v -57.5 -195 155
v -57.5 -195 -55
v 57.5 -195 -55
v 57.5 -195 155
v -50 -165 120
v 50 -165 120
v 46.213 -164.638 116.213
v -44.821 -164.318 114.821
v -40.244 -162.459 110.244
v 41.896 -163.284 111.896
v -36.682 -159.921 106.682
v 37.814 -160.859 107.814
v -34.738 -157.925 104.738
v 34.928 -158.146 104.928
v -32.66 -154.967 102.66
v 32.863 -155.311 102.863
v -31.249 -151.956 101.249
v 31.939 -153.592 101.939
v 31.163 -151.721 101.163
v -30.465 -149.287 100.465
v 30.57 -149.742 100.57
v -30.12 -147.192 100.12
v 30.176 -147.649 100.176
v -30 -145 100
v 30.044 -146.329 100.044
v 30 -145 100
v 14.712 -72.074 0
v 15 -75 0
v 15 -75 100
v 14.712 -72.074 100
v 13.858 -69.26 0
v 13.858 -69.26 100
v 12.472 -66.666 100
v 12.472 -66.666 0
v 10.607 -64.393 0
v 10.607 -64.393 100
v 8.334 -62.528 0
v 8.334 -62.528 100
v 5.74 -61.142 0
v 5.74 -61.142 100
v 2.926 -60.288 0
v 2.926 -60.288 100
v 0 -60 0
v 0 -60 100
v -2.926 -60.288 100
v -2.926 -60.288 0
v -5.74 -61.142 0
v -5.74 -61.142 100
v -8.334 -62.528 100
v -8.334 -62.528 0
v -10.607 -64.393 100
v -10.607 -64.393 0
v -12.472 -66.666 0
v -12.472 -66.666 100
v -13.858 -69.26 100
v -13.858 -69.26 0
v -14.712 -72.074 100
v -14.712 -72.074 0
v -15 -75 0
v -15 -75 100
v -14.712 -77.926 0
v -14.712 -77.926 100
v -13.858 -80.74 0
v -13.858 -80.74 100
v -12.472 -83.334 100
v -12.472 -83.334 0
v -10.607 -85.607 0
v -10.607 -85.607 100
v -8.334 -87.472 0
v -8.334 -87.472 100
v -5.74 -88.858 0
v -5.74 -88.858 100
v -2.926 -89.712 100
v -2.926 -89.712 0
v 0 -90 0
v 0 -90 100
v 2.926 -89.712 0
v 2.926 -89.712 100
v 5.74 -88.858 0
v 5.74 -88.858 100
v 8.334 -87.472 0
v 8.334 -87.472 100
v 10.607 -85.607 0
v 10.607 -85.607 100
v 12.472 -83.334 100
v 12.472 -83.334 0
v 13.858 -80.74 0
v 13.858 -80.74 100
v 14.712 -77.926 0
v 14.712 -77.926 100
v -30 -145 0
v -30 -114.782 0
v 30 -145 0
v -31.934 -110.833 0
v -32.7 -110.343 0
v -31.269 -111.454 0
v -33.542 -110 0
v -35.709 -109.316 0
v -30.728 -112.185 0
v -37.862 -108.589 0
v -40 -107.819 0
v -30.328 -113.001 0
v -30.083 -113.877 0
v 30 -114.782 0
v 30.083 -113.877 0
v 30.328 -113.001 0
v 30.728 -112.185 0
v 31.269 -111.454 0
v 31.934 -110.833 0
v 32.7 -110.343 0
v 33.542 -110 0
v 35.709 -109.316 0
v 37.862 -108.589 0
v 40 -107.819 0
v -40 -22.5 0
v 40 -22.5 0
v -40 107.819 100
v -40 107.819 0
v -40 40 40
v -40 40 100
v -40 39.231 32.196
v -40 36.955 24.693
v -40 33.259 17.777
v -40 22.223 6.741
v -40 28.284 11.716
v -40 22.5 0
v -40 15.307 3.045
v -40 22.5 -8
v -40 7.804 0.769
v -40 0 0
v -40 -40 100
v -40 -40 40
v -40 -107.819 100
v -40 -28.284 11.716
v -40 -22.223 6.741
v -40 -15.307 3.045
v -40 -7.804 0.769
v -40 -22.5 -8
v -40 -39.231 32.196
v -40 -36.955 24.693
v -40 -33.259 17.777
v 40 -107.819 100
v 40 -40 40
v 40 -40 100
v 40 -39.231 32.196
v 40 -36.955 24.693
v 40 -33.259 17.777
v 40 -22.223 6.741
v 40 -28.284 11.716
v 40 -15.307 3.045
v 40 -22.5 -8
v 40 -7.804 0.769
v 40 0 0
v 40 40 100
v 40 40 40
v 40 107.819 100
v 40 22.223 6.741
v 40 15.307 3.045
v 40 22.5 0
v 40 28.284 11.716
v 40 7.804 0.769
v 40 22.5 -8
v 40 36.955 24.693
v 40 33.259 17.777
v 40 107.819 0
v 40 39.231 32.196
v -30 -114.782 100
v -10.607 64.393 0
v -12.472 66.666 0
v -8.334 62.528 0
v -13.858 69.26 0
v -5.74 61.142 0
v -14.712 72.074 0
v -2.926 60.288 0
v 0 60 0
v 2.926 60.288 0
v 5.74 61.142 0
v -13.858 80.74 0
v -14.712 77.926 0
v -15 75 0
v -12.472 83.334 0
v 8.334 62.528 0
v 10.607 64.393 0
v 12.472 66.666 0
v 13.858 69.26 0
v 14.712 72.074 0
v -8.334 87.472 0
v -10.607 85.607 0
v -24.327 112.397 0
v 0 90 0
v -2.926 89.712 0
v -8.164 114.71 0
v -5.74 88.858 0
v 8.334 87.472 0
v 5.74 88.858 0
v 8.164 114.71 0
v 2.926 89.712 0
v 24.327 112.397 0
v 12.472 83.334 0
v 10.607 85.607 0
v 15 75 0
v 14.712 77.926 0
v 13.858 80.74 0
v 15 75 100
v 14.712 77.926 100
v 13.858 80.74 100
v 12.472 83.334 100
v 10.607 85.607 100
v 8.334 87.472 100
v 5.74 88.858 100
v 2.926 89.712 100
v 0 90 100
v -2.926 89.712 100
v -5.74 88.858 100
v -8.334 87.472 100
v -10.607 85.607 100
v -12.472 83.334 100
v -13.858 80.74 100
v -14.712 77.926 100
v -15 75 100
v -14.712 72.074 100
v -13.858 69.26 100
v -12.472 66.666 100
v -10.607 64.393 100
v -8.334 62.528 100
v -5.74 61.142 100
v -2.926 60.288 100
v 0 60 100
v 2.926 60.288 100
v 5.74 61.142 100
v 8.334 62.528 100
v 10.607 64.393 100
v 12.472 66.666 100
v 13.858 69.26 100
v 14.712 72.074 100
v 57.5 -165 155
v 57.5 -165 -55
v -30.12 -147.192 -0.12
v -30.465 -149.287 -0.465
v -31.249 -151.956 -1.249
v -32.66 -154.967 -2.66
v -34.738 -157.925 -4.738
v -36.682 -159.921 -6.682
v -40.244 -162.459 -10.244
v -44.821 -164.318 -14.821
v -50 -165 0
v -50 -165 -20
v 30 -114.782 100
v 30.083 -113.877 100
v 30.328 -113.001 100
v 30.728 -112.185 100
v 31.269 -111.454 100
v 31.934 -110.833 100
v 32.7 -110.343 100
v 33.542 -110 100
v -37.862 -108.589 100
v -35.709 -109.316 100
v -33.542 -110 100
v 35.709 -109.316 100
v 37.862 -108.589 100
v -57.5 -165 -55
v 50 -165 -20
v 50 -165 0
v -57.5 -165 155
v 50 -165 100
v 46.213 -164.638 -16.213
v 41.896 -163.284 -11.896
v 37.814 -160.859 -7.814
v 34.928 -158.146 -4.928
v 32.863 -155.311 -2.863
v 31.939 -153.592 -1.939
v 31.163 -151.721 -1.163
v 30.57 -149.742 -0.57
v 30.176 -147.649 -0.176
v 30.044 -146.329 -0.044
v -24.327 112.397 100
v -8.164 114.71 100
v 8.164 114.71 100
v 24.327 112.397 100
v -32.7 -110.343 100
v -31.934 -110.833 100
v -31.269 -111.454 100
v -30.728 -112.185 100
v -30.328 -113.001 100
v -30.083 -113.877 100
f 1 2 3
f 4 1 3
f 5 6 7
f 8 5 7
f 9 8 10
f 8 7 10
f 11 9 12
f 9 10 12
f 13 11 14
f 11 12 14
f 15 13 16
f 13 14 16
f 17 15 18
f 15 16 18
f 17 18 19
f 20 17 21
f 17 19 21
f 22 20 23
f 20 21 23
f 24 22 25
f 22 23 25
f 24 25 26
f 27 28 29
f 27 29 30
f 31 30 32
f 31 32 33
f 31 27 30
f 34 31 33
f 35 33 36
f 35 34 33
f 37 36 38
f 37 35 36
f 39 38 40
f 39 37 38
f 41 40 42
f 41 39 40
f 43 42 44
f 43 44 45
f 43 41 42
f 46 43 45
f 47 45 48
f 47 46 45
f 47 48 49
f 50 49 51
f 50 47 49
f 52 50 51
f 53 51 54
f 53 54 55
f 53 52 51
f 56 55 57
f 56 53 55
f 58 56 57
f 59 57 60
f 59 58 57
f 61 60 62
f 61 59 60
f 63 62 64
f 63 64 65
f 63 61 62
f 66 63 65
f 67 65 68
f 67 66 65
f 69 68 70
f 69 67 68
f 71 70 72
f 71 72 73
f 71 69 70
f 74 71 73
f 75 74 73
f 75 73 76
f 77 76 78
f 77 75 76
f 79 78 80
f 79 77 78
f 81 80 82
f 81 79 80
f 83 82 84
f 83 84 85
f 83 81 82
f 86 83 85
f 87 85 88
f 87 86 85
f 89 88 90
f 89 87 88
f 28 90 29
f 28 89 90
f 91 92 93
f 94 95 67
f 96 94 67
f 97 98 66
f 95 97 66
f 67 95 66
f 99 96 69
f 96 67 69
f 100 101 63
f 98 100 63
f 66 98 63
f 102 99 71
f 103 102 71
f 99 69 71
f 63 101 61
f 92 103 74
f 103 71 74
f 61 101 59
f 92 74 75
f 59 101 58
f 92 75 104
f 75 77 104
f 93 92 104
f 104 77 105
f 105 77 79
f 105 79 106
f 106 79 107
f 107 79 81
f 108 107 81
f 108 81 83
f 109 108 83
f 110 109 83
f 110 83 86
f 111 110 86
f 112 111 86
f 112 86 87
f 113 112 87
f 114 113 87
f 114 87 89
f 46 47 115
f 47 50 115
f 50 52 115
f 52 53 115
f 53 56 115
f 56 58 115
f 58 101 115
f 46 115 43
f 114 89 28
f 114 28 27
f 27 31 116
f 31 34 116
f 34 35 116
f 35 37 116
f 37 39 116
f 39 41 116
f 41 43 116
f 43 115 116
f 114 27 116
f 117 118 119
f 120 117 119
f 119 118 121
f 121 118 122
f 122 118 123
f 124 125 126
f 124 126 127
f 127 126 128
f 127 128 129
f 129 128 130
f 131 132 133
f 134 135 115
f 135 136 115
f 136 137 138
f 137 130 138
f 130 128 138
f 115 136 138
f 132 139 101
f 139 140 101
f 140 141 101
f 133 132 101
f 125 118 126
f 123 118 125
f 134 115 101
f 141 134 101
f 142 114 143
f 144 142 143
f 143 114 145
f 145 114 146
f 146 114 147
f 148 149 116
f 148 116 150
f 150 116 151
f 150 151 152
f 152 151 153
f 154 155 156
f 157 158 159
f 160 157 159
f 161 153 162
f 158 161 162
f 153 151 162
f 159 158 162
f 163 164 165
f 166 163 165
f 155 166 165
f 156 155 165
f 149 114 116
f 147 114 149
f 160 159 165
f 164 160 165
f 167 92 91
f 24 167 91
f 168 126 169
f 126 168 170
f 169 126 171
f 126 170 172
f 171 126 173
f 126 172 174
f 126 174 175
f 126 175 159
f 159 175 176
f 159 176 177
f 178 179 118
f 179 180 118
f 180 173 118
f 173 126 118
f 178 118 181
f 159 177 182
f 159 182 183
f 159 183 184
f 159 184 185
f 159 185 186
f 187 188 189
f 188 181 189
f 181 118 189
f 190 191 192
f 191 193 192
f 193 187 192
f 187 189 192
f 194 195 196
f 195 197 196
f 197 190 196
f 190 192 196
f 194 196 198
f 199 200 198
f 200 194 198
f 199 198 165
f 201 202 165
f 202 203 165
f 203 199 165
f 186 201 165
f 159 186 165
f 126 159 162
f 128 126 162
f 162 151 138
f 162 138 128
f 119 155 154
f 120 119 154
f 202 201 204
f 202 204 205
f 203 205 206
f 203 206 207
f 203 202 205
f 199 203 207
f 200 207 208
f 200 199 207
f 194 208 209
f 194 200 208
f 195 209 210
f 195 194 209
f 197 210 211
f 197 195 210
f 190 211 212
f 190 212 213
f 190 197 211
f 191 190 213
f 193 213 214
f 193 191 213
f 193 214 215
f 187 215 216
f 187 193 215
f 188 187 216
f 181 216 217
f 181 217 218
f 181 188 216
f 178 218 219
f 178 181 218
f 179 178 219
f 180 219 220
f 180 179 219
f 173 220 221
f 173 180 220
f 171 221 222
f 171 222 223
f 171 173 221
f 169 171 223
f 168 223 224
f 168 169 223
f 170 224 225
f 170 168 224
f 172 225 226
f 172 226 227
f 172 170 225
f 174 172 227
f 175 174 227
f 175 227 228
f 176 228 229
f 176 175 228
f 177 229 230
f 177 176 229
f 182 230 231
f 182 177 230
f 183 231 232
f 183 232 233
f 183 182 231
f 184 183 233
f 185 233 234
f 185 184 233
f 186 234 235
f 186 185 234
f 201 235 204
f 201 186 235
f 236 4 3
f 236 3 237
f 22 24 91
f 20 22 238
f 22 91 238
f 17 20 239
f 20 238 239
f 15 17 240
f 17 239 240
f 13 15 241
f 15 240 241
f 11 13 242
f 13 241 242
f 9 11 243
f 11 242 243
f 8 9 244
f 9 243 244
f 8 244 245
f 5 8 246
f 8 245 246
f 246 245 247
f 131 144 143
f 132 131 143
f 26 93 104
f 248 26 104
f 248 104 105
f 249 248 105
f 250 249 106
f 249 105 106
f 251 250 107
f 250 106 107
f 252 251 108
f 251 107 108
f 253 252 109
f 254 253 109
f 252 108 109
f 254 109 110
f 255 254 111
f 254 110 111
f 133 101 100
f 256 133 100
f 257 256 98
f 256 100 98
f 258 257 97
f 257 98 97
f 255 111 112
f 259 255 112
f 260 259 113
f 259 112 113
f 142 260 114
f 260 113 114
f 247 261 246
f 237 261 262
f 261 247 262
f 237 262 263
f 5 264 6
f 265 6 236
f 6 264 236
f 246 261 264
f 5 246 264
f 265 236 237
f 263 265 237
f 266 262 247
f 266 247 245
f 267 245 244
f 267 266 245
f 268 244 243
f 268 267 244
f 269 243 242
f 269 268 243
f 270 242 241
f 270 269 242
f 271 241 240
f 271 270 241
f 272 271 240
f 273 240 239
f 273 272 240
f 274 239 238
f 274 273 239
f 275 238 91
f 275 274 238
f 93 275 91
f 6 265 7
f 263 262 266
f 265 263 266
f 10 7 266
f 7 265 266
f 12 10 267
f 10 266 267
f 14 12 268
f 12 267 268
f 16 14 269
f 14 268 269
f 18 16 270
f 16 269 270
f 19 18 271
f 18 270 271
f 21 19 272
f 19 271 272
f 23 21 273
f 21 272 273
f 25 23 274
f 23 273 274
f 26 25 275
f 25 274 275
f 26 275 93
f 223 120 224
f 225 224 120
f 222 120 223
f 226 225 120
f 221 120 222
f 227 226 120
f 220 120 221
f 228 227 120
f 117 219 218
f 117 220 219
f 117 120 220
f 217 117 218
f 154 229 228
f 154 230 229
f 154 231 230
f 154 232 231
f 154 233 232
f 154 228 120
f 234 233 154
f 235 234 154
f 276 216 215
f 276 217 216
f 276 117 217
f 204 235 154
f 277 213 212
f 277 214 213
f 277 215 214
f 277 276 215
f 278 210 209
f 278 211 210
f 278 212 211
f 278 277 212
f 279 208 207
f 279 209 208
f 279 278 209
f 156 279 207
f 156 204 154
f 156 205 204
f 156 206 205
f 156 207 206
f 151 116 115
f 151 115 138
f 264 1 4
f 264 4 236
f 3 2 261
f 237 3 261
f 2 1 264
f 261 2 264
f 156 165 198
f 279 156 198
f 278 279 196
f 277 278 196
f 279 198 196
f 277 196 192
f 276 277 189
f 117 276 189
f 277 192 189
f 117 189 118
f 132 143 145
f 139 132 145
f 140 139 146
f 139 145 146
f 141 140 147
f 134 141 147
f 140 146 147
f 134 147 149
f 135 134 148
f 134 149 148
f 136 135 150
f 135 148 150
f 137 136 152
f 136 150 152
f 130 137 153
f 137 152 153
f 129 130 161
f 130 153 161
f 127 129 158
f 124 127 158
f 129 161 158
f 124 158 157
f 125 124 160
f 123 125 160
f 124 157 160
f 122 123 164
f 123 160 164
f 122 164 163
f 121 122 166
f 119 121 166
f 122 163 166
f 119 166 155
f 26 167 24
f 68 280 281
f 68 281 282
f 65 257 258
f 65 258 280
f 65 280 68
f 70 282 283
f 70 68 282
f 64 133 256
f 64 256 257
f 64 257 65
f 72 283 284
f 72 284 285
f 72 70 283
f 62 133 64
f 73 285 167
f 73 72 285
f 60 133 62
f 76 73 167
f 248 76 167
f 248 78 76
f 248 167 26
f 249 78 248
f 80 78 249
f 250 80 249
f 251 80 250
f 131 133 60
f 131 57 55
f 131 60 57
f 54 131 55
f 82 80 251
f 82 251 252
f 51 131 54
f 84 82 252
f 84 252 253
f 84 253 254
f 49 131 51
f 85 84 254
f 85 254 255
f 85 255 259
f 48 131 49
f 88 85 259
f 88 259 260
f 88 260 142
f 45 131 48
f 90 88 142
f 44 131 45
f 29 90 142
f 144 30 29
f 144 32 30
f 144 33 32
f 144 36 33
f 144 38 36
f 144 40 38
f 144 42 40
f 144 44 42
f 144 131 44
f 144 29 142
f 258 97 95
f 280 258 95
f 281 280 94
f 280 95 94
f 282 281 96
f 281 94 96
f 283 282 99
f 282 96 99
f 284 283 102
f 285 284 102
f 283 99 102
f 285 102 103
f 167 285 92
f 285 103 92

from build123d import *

# Parameters (mm, degrees)
SKETCH1_R           = 15
BOSS_EXTRUDE2_DEPTH = 100
SKETCH3_W           = 115
SKETCH3_H           = 30
BOSS_EXTRUDE3_DEPTH = 160
SKETCH4_W           = 5
SKETCH4_H           = 30
SKETCH4_W_2         = 105
CUT_EXTRUDE1_DEPTH  = 320
FILLET5_R           = 20
FILLET6_R           = 20
SKETCH6_W           = 8
SKETCH6_H           = 45
BOSS_EXTRUDE4_DEPTH = 80
CUT_EXTRUDE2_DEPTH  = 80


with BuildPart() as part:
    # Sketch1 → Boss-Extrude2 (new body)
    with BuildSketch(Plane.XY):
        with BuildLine():
            ThreePointArc((33.541666667, -109.999802714), (36.786992802, -108.957409847), (40, -107.819293264))
            Line((40, -107.819293264), (40, 107.819293264))
            ThreePointArc((40, 107.819293264), (0, 115), (-40, 107.819293264))
            Line((-40, 107.819293264), (-40, -107.819293264))
            ThreePointArc((-40, -107.819293264), (-36.786992802, -108.957409847), (-33.541666667, -109.999802714))
            ThreePointArc((-33.541666667, -109.999802714), (-30.981812183, -111.806807654), (-30, -114.782402832))
            Line((-30, -114.782402832), (-30, -145))
            ThreePointArc((-30, -145), (-35.857864376, -159.142135624), (-50, -165))
            Line((-50, -165), (-30, -165))
            Line((-30, -165), (30, -165))
            Line((30, -165), (50, -165))
            ThreePointArc((50, -165), (35.857864376, -159.142135624), (30, -145))
            Line((30, -145), (30, -114.782402832))
            ThreePointArc((30, -114.782402832), (30.981812183, -111.806807654), (33.541666667, -109.999802714))
        make_face()
        with Locations((0, -75)):
            Circle(SKETCH1_R, mode=Mode.SUBTRACT)
        with Locations((0, 75)):
            Circle(SKETCH1_R, mode=Mode.SUBTRACT)
    extrude(amount=BOSS_EXTRUDE2_DEPTH)

    # Sketch3 → Boss-Extrude3 (add, symmetric)
    with BuildSketch(Plane.XY):
        with Locations((0, -180)):
            Rectangle(SKETCH3_W, SKETCH3_H)
    extrude(amount=BOSS_EXTRUDE3_DEPTH, both=True)

    # Sketch4 → Cut-Extrude1 (cut)
    with BuildSketch(Plane(origin=(57.5, 0, 0), x_dir=(0, 0, -1), z_dir=(1, 0, 0))):
        with Locations((-157.5, -180)):
            Rectangle(SKETCH4_W, SKETCH4_H)
        with Locations((107.5, -180)):
            Rectangle(SKETCH4_W_2, SKETCH4_H)
    extrude(amount=-CUT_EXTRUDE1_DEPTH, mode=Mode.SUBTRACT)

    # Fillet5
    fillet5_edges = [part.edges().sort_by_distance(p)[0] for p in [
        (0, -165, 100),
    ]]
    fillet(fillet5_edges, radius=FILLET5_R)

    # Fillet6
    fillet6_edges = [part.edges().sort_by_distance(p)[0] for p in [
        (0, -165, 0),
    ]]
    fillet(fillet6_edges, radius=FILLET6_R)

    # Sketch6 → Boss-Extrude4 (add)
    with BuildSketch(Plane(origin=(40, 0, 0), x_dir=(0, 0, -1), z_dir=(1, 0, 0))):
        with Locations((4, 0)):
            Rectangle(SKETCH6_W, SKETCH6_H)
    extrude(amount=-BOSS_EXTRUDE4_DEPTH)

    # Sketch7 → Cut-Extrude2 (cut)
    with BuildSketch(Plane(origin=(40, 0, 0), x_dir=(0, 0, -1), z_dir=(1, 0, 0))):
        with BuildLine():
            Line((-40, 40), (-100, 40))
            Line((-100, 40), (-100, -40))
            Line((-100, -40), (-40, -40))
            ThreePointArc((-40, -40), (0, 0), (-40, 40))
        make_face()
    extrude(amount=-CUT_EXTRUDE2_DEPTH, mode=Mode.SUBTRACT)


solid = part.part
